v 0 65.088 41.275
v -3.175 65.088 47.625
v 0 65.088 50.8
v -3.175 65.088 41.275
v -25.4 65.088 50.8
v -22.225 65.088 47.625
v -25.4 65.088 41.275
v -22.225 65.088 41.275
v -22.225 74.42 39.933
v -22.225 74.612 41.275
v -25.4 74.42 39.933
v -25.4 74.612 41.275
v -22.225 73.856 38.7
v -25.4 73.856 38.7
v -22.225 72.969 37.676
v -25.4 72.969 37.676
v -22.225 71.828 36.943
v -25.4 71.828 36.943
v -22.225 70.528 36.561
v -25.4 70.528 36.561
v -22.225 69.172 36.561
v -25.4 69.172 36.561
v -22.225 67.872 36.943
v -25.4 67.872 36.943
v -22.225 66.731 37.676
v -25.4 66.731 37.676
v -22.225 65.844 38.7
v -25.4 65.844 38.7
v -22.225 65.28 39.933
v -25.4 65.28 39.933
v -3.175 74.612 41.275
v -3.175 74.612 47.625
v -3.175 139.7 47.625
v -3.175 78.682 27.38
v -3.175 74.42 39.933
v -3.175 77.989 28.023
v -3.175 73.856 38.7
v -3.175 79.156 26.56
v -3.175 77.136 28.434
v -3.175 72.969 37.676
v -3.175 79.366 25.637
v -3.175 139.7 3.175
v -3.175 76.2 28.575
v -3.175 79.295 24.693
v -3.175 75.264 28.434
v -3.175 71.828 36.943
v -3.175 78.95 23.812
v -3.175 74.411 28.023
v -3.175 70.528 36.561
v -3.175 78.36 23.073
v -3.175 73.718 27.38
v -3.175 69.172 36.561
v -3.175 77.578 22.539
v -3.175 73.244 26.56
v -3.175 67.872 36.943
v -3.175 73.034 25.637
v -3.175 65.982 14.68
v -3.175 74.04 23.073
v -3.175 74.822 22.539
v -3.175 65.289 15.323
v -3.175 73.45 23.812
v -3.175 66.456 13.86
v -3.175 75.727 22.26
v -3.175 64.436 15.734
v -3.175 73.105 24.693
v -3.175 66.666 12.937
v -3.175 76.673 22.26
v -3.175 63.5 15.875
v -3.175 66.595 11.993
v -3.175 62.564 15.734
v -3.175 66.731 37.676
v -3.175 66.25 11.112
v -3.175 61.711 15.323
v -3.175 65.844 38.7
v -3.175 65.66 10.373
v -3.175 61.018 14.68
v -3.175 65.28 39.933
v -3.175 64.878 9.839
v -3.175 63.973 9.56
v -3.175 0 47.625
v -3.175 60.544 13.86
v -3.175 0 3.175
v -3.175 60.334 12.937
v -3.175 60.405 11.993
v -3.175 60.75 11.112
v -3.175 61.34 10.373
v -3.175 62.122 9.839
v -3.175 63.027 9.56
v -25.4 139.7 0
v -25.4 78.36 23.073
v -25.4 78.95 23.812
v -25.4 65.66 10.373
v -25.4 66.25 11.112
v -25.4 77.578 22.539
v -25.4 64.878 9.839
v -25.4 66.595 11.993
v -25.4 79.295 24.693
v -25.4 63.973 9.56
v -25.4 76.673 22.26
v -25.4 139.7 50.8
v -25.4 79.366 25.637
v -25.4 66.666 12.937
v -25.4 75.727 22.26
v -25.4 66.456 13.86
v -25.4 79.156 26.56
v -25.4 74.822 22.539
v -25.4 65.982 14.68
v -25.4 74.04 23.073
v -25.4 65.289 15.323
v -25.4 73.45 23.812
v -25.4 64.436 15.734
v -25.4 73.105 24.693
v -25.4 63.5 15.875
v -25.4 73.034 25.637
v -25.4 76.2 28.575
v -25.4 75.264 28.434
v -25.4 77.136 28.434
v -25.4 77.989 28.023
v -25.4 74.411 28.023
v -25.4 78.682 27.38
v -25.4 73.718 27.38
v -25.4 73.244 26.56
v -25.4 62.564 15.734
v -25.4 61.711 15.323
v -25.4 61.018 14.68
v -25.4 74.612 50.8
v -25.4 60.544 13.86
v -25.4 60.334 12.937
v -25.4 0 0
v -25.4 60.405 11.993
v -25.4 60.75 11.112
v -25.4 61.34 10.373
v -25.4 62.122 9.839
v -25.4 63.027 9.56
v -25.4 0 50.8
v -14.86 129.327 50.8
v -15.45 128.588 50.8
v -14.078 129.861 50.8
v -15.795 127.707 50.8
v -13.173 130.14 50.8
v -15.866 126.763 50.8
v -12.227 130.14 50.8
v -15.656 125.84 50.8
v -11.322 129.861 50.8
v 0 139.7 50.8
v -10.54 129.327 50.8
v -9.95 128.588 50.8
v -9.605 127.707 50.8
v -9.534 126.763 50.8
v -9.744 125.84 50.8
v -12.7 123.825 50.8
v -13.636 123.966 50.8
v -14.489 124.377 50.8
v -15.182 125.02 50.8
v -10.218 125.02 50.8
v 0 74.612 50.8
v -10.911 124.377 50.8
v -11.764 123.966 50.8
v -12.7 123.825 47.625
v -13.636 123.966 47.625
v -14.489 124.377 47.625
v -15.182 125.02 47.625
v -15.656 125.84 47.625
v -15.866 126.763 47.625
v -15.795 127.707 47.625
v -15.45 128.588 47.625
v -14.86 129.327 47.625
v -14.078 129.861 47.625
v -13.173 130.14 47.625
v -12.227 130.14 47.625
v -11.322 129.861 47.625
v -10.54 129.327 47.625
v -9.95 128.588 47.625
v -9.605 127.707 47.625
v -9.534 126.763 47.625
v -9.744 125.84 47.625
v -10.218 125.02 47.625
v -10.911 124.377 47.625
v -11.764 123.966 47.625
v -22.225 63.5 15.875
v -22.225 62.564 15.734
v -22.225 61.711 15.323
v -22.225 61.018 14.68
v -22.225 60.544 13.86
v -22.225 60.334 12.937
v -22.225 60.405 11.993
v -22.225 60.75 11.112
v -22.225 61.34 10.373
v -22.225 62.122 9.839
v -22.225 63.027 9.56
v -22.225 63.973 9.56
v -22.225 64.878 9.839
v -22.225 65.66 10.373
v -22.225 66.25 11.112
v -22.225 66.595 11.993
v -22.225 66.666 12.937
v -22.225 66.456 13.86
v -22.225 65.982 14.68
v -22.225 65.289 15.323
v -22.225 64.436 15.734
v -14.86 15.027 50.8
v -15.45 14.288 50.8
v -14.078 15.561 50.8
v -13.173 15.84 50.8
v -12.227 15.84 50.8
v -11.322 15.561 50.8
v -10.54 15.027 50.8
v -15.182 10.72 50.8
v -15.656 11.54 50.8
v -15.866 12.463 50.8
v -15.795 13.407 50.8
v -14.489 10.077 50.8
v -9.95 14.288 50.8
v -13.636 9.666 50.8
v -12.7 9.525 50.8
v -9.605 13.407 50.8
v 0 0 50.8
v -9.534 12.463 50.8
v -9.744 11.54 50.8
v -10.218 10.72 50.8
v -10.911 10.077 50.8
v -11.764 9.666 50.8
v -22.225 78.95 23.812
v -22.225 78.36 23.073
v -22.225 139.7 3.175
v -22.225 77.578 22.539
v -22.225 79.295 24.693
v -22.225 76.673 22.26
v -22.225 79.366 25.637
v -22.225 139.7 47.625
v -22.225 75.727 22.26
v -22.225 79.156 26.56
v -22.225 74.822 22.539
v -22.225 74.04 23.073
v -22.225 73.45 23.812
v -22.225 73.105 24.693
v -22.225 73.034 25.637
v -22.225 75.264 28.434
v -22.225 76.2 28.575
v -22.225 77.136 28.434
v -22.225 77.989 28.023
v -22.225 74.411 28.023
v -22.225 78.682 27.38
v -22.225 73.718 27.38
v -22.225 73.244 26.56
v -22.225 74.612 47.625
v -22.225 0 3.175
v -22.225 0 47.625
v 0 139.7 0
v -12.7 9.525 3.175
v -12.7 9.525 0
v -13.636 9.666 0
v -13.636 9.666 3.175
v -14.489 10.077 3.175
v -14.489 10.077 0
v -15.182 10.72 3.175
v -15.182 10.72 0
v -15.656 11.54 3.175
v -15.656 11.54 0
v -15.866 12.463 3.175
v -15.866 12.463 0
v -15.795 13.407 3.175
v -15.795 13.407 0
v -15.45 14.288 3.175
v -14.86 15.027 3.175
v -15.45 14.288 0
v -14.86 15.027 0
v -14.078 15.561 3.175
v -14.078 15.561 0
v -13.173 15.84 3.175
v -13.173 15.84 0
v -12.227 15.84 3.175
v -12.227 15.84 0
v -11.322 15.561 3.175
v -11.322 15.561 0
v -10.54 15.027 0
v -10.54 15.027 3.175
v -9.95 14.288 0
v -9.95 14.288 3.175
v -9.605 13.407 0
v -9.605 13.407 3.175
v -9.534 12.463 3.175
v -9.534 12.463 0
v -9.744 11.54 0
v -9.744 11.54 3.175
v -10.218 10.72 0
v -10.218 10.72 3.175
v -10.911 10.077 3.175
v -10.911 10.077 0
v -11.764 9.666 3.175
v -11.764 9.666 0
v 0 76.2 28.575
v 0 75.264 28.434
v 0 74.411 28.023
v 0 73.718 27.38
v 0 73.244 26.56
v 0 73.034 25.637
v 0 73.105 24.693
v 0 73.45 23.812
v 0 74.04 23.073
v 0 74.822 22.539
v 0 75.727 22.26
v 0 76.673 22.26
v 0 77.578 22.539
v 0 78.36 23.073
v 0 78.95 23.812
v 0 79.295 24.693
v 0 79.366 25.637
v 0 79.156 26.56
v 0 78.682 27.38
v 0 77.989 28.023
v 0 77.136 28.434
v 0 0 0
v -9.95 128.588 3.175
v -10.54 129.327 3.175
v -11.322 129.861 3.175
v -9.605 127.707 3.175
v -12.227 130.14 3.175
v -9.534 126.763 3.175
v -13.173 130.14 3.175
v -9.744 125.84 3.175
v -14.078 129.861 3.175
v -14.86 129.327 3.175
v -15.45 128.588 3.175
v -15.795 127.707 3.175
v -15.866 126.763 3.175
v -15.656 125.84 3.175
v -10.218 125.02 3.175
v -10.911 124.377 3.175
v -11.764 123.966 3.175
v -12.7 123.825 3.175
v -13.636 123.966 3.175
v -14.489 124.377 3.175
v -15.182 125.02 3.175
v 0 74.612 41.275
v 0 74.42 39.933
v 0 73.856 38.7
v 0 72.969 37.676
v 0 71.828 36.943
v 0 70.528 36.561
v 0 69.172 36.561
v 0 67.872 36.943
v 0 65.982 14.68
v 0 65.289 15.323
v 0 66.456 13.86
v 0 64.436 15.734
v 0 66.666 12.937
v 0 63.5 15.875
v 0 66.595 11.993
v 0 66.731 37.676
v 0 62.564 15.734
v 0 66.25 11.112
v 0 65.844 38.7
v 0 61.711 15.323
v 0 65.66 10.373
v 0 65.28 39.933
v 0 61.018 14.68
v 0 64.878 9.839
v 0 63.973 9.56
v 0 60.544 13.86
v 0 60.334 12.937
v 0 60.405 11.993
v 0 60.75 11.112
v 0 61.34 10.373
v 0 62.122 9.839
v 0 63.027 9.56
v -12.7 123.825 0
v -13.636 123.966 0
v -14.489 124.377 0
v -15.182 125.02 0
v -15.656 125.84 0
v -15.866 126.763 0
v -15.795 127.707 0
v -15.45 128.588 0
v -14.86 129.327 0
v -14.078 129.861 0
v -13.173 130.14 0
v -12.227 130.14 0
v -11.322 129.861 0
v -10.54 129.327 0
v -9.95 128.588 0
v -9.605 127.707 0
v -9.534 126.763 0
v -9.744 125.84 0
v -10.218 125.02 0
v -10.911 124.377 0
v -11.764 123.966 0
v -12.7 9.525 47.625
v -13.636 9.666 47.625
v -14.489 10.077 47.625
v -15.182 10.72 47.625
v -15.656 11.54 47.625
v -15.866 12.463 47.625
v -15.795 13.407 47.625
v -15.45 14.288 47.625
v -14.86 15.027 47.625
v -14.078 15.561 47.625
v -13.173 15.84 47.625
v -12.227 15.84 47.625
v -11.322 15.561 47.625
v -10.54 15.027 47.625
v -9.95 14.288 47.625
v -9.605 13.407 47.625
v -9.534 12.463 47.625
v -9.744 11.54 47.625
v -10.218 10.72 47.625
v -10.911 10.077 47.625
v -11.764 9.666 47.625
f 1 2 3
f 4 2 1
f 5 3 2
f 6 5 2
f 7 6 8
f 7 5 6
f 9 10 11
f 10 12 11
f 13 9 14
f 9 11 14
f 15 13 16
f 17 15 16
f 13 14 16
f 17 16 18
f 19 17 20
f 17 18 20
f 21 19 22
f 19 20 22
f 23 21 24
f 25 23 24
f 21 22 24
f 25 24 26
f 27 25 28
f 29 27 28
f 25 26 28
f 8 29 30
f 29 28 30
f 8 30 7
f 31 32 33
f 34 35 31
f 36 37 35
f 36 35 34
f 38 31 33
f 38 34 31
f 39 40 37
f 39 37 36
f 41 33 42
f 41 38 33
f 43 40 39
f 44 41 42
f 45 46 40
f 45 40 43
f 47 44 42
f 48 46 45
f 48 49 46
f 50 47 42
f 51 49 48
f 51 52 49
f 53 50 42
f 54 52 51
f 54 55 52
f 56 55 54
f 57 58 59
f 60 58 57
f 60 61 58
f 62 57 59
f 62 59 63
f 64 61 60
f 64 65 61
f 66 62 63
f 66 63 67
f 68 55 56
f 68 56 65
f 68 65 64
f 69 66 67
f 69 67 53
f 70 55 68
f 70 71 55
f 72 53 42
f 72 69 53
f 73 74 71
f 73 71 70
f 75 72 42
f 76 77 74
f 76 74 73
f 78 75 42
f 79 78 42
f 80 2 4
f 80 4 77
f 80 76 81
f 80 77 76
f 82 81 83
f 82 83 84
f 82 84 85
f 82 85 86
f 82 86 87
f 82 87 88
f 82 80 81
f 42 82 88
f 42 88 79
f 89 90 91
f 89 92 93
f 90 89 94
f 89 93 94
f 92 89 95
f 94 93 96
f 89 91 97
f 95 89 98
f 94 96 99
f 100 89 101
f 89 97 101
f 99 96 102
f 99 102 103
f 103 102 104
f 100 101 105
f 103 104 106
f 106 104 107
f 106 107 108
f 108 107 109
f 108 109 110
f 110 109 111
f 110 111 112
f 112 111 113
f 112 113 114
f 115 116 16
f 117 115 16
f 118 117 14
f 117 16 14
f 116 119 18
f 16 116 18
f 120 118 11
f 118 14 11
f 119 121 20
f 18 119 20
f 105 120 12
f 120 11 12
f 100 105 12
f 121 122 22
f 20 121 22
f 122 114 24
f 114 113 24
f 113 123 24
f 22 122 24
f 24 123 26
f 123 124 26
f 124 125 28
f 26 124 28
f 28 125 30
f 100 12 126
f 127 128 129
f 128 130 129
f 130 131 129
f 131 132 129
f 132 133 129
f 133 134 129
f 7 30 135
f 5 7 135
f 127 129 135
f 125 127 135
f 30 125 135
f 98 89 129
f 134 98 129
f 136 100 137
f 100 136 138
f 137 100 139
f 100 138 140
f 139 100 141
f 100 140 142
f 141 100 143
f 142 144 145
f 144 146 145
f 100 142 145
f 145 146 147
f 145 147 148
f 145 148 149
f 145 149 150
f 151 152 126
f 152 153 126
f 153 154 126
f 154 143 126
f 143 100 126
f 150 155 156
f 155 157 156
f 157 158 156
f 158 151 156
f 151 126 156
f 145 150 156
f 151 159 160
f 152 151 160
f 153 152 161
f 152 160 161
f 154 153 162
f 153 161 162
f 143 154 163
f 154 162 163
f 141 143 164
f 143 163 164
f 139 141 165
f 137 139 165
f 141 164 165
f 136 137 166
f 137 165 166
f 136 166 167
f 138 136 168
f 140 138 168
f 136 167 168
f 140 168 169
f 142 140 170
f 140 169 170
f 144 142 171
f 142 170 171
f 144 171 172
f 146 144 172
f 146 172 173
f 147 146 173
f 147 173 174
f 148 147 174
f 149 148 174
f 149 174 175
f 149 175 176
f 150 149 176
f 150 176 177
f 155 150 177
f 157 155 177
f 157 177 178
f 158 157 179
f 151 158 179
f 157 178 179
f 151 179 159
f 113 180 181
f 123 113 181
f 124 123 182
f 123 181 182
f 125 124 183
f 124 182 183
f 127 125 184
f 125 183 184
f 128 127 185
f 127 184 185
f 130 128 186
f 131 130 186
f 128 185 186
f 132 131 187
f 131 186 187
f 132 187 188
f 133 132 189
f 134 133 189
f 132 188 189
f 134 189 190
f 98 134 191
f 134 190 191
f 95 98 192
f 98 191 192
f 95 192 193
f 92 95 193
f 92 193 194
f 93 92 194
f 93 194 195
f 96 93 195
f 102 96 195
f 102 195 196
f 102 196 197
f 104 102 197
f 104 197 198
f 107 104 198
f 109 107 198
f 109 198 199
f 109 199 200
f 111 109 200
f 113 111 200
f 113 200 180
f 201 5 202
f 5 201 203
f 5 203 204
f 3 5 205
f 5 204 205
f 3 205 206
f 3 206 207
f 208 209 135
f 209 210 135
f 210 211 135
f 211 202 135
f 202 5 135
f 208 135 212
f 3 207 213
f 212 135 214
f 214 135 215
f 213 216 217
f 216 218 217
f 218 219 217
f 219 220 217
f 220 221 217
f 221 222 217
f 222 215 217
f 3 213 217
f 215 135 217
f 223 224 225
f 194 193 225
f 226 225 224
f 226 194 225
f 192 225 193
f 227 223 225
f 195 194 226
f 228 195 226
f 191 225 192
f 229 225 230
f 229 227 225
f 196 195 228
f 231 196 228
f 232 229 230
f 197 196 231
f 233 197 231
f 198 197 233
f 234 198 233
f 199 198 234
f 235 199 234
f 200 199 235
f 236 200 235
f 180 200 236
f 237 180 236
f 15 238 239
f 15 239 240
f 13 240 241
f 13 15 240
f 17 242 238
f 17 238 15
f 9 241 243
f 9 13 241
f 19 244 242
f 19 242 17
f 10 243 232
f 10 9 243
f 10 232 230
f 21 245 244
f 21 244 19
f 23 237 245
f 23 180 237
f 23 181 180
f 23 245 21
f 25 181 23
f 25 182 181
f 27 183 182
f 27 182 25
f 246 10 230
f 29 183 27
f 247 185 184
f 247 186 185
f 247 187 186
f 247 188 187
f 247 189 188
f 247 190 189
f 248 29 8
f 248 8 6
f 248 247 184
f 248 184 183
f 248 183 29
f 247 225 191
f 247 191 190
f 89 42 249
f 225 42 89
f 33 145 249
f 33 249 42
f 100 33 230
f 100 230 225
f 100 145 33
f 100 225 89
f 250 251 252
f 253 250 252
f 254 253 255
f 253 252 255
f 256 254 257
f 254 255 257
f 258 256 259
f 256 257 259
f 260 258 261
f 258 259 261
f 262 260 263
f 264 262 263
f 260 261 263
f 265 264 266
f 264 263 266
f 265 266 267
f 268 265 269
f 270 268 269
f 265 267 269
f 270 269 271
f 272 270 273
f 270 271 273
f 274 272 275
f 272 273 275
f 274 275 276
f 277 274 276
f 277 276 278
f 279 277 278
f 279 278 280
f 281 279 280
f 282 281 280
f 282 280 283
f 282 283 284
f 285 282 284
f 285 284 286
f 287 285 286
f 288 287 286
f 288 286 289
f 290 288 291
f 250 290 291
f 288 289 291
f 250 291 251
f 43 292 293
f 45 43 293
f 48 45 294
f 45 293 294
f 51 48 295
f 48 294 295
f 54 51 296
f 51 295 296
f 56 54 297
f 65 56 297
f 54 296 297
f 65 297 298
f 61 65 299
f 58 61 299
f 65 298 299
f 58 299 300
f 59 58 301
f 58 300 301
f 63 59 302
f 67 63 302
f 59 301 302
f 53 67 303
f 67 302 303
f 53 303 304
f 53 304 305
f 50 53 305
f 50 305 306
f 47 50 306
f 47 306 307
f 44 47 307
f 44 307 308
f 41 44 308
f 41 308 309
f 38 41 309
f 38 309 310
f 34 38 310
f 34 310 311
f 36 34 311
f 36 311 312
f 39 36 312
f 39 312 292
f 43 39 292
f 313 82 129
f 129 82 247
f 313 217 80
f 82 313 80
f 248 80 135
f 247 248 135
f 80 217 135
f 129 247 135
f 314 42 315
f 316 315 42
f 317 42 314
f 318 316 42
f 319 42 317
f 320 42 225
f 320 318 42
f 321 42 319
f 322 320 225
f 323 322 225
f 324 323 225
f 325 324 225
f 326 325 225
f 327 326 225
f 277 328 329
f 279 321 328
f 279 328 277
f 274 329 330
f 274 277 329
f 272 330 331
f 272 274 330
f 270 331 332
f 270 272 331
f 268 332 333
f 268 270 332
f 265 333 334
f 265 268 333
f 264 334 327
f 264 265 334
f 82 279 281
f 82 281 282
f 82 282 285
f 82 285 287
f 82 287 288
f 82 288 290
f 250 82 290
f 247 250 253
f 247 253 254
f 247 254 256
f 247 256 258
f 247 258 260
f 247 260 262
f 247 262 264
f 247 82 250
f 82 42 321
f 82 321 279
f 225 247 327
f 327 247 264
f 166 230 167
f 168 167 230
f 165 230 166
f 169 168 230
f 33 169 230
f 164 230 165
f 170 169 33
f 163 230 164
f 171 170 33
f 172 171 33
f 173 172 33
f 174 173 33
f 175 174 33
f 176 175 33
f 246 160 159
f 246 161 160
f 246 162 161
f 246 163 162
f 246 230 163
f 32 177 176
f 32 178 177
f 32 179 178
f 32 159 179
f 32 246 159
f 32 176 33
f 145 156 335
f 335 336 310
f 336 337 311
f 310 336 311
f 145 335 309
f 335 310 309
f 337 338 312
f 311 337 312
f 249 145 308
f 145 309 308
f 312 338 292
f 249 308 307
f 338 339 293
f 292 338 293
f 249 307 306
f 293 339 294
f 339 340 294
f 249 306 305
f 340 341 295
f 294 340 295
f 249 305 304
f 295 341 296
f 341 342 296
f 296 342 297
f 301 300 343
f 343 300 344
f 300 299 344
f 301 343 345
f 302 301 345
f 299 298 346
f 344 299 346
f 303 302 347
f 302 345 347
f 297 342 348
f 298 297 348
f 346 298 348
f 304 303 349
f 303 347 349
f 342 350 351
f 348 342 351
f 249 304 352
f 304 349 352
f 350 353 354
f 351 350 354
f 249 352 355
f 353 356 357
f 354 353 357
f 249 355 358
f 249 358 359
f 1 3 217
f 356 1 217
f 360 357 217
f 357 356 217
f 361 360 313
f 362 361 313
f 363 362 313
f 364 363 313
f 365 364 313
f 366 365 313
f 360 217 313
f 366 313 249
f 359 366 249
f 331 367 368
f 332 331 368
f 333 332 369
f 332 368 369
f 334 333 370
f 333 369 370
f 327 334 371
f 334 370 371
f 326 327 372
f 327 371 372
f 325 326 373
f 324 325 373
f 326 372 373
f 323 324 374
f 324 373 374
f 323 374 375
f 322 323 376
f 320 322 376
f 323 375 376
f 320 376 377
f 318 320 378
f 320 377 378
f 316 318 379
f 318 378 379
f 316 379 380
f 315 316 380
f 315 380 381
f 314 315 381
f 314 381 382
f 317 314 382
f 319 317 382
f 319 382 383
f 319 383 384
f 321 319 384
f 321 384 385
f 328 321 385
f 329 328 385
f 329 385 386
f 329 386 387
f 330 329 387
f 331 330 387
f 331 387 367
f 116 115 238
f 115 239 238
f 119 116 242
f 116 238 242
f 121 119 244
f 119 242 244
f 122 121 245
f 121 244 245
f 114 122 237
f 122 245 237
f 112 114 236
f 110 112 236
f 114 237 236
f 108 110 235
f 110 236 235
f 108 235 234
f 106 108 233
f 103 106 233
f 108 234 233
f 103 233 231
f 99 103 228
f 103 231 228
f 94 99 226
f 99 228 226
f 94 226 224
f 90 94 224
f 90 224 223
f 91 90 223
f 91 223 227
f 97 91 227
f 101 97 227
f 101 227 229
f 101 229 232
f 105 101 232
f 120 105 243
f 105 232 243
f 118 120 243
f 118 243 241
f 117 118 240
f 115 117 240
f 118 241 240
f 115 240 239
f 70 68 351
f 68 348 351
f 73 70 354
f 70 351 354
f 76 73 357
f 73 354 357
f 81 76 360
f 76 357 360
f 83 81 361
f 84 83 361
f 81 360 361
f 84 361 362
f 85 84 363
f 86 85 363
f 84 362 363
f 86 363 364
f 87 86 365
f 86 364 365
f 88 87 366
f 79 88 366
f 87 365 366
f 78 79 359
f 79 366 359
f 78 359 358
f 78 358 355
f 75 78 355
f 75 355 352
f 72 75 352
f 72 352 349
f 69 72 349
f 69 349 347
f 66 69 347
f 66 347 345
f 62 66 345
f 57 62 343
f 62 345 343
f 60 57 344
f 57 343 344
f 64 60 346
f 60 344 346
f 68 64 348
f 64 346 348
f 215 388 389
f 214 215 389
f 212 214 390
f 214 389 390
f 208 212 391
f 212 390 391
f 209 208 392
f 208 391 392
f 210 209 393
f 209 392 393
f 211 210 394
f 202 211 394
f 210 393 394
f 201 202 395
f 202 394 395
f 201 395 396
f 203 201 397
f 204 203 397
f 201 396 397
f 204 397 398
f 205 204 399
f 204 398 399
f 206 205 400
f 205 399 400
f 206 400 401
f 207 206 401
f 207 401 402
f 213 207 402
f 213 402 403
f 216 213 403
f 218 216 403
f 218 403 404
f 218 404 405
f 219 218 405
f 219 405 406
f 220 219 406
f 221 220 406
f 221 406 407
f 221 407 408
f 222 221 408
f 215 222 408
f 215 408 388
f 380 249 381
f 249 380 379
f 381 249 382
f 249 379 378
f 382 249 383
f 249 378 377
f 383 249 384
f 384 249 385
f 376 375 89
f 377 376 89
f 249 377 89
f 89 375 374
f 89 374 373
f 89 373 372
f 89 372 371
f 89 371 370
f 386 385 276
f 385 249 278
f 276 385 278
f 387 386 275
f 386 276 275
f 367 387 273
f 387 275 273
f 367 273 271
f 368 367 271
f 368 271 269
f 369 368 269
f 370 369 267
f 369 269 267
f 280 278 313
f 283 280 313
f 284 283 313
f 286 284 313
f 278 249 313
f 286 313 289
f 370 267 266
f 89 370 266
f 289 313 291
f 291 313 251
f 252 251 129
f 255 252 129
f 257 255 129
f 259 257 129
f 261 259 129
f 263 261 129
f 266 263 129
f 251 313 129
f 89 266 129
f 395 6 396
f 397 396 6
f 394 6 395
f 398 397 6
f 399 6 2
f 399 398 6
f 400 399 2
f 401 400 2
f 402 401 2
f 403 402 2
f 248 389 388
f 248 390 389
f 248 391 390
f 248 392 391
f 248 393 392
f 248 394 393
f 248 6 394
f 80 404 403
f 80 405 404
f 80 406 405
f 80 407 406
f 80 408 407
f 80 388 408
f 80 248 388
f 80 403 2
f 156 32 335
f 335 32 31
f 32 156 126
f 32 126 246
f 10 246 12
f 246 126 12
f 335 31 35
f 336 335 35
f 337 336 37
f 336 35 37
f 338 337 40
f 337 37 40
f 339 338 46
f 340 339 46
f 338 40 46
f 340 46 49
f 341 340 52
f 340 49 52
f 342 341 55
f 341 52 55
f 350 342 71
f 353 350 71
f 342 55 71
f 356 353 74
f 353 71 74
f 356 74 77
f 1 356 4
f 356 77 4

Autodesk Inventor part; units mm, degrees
ref_plane "YZ Plane" through (0, 0, 0) normal (1, 0, 0) x (0, 1, 0)
ref_plane "XZ Plane" through (0, 0, 0) normal (0, 1, 0) x (-1, 0, 0)
ref_plane "XY Plane" through (0, 0, 0) normal (0, 0, 1) x (1, 0, 0)
sketch "Sketch1" plane through (0, 0, 0) normal (0, 1, 0) x (-1, 0, 0)
  line L0 (0, 0) -> (25.4, 0)
  line L1 (25.4, 0) -> (25.4, 50.8)
  line L2 (25.4, 50.8) -> (0, 50.8)
  line L3 (0, 50.8) -> (0, 0)
  line L4 (3.175, 3.175) -> (22.225, 3.175)
  line L5 (22.225, 3.175) -> (22.225, 47.625)
  line L6 (22.225, 47.625) -> (3.175, 47.625)
  line L7 (3.175, 47.625) -> (3.175, 3.175)
  dimension "d0" = 25.4
  dimension "d1" = 50.8
  dimension "d2" = 19.05
  dimension "d3" = 44.45
  dimension "d4" = 3.175
  dimension "d5" = 3.175
extrude "Extrusion1" add sketch "Sketch1" along normal blind 139.7
sketch "Sketch2" plane through (-25.4, 0, 50.8) normal (0, 0, 1) x (1, 0, 0)
  line L0 (0, 0) -> (25.4, 0) projected
  line L1 (25.4, 0) -> (25.4, 139.7) projected
  line L2 (0, 139.7) -> (25.4, 139.7) projected
  line L3 (0, 0) -> (0, 139.7) projected
  point P0 (12.7, 127)
  point P1 (12.7, 12.7)
  dimension "d8" = 12.7
  dimension "d9" = 12.7
  dimension "d10" = 12.7
  dimension "d11" = 12.7
hole "Hole1" at (-12.7, 127, 50.8) at (-12.7, 12.7, 50.8) direction (0, 0, -1) diameter 6.35 end through all
sketch "Sketch3" plane through (-25.4, 0, 0) normal (-1, 0, 0) x (0, 0, 1)
  line L0 (0, 0) -> (50.8, 0) projected
  line L1 (50.8, 0) -> (50.8, 139.7) projected
  line L2 (0, 139.7) -> (50.8, 139.7) projected
  line L3 (0, 0) -> (0, 139.7) projected
  circle A0 centre (41.275, 69.85) radius 4.7625 construction
  line L4 (41.275, 69.85) -> (41.275, 65.0875) construction
  line L5 (41.275, 69.85) -> (41.275, 74.6125) construction
  line L6 (50.8, 74.6125) -> (41.275, 74.6125)
  line L7 (50.8, 0) -> (50.8, 139.7) projected
  line L8 (50.8, 65.0875) -> (41.275, 65.0875)
  line L9 (50.8, 74.6125) -> (50.8, 65.0875)
  arc A1 (41.275, 74.6125) -> (41.275, 65.0875) centre (41.275, 69.85) ccw
  dimension "d19" = 69.85
  dimension "d20" = 9.525
  dimension "d21" = 9.525
extrude "Extrusion2" cut sketch "Sketch3" against normal blind 155.575 contours L8 A1 L6 L1
sketch "Sketch4" plane through (-25.4, 0, 0) normal (-1, 0, 0) x (0, 0, 1)
  line L0 (0, 0) -> (50.8, 0) projected
  line L1 (0, 0) -> (0, 139.7) projected
  point P0 (12.7, 63.5)
  point P1 (25.4, 76.2)
  dimension "d24" = 12.7
  dimension "d25" = 12.7
  dimension "d26" = 63.5
  dimension "d27" = 12.7
hole "Hole2" at (-25.4, 63.5, 12.7) at (-25.4, 76.2, 25.4) direction (1, 0, 0) diameter 6.35 end through all
properties part number "2x1 axle support"
